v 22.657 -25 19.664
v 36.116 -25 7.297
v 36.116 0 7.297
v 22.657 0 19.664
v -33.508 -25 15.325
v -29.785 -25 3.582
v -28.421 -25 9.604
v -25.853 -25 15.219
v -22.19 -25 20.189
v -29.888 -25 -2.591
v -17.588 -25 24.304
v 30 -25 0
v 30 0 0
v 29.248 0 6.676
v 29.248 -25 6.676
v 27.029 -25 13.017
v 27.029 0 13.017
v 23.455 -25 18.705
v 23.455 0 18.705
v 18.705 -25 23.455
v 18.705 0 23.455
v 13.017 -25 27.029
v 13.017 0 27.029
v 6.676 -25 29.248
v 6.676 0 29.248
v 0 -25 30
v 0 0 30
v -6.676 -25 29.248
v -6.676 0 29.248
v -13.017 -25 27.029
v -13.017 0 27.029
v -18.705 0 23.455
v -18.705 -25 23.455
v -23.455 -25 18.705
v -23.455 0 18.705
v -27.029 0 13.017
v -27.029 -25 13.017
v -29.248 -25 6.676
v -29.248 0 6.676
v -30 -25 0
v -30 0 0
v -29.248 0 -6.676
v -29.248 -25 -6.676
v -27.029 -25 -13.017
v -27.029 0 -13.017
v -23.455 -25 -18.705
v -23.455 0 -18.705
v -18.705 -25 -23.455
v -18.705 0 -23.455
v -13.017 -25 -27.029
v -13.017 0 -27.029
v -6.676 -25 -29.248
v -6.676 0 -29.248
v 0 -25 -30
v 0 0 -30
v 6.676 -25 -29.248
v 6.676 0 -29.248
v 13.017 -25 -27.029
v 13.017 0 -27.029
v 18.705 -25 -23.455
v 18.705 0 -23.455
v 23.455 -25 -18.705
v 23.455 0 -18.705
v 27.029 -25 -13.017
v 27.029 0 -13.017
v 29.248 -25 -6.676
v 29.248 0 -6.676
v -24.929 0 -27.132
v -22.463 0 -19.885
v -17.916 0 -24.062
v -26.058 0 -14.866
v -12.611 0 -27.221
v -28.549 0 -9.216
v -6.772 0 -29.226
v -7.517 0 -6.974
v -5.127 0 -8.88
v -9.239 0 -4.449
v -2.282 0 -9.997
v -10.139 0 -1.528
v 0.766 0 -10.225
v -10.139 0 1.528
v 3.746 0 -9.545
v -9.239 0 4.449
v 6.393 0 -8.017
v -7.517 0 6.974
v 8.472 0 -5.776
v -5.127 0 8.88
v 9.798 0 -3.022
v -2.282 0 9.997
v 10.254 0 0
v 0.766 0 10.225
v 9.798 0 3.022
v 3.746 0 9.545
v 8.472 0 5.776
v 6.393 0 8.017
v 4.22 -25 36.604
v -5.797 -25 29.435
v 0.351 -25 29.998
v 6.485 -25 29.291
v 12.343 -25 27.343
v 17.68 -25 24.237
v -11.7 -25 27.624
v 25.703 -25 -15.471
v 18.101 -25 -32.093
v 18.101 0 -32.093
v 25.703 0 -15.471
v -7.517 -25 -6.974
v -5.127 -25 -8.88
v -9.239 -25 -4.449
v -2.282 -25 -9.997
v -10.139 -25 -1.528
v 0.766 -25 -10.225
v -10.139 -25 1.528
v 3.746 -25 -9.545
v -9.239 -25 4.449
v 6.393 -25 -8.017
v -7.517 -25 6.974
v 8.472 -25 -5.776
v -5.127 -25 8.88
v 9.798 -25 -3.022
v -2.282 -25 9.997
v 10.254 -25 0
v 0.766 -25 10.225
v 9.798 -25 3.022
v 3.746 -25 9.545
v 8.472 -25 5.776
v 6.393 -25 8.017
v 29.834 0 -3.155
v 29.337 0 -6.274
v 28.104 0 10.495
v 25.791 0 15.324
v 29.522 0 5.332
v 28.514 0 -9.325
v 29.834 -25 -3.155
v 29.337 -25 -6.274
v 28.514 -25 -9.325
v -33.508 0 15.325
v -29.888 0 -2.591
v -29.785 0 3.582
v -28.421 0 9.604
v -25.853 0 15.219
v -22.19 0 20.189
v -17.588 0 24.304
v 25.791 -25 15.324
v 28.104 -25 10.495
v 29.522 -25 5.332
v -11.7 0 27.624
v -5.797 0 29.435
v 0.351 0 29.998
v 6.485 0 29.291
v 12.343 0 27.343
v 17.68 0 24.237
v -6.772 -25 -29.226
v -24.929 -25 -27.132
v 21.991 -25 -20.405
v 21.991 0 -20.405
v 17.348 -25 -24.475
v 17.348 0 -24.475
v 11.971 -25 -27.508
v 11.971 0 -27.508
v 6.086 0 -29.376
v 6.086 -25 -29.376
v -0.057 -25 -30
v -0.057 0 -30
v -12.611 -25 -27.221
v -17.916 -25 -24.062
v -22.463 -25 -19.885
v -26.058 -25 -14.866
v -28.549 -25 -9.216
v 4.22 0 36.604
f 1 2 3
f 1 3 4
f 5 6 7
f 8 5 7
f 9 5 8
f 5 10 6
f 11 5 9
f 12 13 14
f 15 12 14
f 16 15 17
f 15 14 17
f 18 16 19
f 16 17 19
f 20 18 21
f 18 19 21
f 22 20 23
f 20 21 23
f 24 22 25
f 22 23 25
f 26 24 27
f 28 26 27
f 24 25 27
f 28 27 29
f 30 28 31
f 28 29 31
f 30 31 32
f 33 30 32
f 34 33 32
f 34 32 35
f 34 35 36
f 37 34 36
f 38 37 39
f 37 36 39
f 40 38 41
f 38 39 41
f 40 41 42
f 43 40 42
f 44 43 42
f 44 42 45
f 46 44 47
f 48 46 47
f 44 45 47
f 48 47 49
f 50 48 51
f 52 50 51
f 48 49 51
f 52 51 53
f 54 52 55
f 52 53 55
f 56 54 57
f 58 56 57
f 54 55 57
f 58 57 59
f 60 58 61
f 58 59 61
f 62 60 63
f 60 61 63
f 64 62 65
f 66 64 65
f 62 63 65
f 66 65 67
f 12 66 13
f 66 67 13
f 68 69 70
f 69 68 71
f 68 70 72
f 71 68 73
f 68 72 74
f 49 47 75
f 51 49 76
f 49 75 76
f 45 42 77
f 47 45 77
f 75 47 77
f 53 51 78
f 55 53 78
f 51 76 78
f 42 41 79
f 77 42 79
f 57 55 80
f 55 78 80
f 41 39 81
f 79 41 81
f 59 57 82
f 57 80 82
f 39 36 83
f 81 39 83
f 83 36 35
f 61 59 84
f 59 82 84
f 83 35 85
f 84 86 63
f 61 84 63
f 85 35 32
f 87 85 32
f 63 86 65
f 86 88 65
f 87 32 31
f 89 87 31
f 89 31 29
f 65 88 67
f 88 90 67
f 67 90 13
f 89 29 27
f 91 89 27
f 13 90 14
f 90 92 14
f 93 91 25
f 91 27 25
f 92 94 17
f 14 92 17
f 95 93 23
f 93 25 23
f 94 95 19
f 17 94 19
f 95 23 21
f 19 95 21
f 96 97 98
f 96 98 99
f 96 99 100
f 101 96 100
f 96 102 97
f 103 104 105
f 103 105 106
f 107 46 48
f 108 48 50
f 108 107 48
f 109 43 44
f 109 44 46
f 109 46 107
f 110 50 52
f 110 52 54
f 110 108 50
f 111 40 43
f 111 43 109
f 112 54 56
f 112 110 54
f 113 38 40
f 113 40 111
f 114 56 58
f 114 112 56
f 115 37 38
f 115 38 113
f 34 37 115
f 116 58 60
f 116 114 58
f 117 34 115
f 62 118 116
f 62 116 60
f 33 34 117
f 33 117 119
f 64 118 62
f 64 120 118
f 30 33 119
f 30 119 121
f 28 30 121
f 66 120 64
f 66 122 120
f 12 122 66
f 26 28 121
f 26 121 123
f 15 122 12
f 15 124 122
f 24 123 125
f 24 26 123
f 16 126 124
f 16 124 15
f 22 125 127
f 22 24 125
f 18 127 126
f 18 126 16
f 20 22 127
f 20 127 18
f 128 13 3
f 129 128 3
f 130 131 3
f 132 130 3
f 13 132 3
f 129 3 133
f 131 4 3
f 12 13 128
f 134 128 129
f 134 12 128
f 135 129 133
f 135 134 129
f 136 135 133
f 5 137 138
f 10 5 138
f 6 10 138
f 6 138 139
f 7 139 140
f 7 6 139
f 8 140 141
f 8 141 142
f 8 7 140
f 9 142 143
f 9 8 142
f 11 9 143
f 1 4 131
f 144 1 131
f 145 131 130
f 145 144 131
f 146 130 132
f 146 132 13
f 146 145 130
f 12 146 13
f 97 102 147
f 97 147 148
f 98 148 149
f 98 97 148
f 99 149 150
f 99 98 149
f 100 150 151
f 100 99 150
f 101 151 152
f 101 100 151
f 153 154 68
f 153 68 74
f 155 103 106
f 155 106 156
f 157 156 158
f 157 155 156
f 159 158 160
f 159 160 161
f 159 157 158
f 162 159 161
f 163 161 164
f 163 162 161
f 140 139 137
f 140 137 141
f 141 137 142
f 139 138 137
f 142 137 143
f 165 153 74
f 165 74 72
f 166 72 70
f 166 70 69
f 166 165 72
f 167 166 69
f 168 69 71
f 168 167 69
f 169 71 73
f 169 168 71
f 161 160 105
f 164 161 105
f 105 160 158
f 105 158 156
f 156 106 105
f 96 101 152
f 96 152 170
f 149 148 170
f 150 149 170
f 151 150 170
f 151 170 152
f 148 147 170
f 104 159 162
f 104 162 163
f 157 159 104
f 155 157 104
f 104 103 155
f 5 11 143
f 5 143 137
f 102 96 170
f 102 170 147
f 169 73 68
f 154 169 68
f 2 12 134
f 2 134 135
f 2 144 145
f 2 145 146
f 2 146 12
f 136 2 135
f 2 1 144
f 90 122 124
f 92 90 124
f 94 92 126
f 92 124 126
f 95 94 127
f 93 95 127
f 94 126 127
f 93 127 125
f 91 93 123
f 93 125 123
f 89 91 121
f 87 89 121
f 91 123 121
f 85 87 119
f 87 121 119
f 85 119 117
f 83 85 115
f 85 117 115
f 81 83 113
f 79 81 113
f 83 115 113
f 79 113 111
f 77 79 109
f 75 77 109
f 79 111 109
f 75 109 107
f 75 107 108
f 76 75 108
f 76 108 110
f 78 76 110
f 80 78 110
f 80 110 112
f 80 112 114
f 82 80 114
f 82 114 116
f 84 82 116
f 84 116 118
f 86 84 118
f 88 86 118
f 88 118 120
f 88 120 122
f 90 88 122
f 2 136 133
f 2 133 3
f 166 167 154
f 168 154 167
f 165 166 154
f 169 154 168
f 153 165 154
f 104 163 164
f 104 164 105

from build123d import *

# Parameters (mm, degrees)
F0_R     = 30
F1_DEPTH = 25
F2_R     = 10.25397
F3_DEPTH = 25.001
F5_DEPTH = 25


with BuildPart() as f1:
    # F0 (on Front) → F1 (new body)
    with BuildSketch(Plane.XZ):
        Circle(F0_R)
    extrude(amount=F1_DEPTH)

    # F2 (on face) → F3 (cut, through all)
    with BuildSketch(Plane.XZ.offset(25)):
        Circle(F2_R)
    extrude(amount=-F3_DEPTH, mode=Mode.SUBTRACT)


with BuildPart() as f5:
    # F4 (on face) → F5 (new body)
    with BuildSketch(Plane.XZ.offset(25)):
        with BuildLine():
            Line((-33.507877, 15.324773), (-29.887897, -2.591058))
            ThreePointArc((-29.887897, -2.591058), (-27.282114, 12.47743), (-17.587544, 24.303874))
            Line((-17.587544, 24.303874), (-33.507877, 15.324773))
        make_face()
        with BuildLine():
            Line((4.220222, 36.6035), (-11.700111, 27.624399))
            ThreePointArc((-11.700111, 27.624399), (3.436104, 29.80257), (17.679508, 24.237059))
            Line((17.679508, 24.237059), (4.220222, 36.6035))
        make_face()
        with BuildLine():
            ThreePointArc((30, 0), (29.626191, -4.7211), (28.514081, -9.324548))
            Line((28.514081, -9.324548), (36.116117, 7.297434))
            Line((36.116117, 7.297434), (22.656831, 19.663876))
            ThreePointArc((22.656831, 19.663876), (28.104314, 10.495119), (30, 0))
        make_face()
        with BuildLine():
            ThreePointArc((25.702803, -15.471455), (14.737644, -26.130477), (-0.056837, -29.999946))
            Line((-0.056837, -29.999946), (18.100766, -32.093437))
            Line((18.100766, -32.093437), (25.702803, -15.471455))
        make_face()
        with BuildLine():
            Line((-28.549208, -9.216438), (-24.929228, -27.132269))
            Line((-24.929228, -27.132269), (-6.771625, -29.225761))
            ThreePointArc((-6.771625, -29.225761), (-20.297378, -22.091094), (-28.549208, -9.216438))
        make_face()
    extrude(amount=-F5_DEPTH)


solid = Compound([f1.part, f5.part])
